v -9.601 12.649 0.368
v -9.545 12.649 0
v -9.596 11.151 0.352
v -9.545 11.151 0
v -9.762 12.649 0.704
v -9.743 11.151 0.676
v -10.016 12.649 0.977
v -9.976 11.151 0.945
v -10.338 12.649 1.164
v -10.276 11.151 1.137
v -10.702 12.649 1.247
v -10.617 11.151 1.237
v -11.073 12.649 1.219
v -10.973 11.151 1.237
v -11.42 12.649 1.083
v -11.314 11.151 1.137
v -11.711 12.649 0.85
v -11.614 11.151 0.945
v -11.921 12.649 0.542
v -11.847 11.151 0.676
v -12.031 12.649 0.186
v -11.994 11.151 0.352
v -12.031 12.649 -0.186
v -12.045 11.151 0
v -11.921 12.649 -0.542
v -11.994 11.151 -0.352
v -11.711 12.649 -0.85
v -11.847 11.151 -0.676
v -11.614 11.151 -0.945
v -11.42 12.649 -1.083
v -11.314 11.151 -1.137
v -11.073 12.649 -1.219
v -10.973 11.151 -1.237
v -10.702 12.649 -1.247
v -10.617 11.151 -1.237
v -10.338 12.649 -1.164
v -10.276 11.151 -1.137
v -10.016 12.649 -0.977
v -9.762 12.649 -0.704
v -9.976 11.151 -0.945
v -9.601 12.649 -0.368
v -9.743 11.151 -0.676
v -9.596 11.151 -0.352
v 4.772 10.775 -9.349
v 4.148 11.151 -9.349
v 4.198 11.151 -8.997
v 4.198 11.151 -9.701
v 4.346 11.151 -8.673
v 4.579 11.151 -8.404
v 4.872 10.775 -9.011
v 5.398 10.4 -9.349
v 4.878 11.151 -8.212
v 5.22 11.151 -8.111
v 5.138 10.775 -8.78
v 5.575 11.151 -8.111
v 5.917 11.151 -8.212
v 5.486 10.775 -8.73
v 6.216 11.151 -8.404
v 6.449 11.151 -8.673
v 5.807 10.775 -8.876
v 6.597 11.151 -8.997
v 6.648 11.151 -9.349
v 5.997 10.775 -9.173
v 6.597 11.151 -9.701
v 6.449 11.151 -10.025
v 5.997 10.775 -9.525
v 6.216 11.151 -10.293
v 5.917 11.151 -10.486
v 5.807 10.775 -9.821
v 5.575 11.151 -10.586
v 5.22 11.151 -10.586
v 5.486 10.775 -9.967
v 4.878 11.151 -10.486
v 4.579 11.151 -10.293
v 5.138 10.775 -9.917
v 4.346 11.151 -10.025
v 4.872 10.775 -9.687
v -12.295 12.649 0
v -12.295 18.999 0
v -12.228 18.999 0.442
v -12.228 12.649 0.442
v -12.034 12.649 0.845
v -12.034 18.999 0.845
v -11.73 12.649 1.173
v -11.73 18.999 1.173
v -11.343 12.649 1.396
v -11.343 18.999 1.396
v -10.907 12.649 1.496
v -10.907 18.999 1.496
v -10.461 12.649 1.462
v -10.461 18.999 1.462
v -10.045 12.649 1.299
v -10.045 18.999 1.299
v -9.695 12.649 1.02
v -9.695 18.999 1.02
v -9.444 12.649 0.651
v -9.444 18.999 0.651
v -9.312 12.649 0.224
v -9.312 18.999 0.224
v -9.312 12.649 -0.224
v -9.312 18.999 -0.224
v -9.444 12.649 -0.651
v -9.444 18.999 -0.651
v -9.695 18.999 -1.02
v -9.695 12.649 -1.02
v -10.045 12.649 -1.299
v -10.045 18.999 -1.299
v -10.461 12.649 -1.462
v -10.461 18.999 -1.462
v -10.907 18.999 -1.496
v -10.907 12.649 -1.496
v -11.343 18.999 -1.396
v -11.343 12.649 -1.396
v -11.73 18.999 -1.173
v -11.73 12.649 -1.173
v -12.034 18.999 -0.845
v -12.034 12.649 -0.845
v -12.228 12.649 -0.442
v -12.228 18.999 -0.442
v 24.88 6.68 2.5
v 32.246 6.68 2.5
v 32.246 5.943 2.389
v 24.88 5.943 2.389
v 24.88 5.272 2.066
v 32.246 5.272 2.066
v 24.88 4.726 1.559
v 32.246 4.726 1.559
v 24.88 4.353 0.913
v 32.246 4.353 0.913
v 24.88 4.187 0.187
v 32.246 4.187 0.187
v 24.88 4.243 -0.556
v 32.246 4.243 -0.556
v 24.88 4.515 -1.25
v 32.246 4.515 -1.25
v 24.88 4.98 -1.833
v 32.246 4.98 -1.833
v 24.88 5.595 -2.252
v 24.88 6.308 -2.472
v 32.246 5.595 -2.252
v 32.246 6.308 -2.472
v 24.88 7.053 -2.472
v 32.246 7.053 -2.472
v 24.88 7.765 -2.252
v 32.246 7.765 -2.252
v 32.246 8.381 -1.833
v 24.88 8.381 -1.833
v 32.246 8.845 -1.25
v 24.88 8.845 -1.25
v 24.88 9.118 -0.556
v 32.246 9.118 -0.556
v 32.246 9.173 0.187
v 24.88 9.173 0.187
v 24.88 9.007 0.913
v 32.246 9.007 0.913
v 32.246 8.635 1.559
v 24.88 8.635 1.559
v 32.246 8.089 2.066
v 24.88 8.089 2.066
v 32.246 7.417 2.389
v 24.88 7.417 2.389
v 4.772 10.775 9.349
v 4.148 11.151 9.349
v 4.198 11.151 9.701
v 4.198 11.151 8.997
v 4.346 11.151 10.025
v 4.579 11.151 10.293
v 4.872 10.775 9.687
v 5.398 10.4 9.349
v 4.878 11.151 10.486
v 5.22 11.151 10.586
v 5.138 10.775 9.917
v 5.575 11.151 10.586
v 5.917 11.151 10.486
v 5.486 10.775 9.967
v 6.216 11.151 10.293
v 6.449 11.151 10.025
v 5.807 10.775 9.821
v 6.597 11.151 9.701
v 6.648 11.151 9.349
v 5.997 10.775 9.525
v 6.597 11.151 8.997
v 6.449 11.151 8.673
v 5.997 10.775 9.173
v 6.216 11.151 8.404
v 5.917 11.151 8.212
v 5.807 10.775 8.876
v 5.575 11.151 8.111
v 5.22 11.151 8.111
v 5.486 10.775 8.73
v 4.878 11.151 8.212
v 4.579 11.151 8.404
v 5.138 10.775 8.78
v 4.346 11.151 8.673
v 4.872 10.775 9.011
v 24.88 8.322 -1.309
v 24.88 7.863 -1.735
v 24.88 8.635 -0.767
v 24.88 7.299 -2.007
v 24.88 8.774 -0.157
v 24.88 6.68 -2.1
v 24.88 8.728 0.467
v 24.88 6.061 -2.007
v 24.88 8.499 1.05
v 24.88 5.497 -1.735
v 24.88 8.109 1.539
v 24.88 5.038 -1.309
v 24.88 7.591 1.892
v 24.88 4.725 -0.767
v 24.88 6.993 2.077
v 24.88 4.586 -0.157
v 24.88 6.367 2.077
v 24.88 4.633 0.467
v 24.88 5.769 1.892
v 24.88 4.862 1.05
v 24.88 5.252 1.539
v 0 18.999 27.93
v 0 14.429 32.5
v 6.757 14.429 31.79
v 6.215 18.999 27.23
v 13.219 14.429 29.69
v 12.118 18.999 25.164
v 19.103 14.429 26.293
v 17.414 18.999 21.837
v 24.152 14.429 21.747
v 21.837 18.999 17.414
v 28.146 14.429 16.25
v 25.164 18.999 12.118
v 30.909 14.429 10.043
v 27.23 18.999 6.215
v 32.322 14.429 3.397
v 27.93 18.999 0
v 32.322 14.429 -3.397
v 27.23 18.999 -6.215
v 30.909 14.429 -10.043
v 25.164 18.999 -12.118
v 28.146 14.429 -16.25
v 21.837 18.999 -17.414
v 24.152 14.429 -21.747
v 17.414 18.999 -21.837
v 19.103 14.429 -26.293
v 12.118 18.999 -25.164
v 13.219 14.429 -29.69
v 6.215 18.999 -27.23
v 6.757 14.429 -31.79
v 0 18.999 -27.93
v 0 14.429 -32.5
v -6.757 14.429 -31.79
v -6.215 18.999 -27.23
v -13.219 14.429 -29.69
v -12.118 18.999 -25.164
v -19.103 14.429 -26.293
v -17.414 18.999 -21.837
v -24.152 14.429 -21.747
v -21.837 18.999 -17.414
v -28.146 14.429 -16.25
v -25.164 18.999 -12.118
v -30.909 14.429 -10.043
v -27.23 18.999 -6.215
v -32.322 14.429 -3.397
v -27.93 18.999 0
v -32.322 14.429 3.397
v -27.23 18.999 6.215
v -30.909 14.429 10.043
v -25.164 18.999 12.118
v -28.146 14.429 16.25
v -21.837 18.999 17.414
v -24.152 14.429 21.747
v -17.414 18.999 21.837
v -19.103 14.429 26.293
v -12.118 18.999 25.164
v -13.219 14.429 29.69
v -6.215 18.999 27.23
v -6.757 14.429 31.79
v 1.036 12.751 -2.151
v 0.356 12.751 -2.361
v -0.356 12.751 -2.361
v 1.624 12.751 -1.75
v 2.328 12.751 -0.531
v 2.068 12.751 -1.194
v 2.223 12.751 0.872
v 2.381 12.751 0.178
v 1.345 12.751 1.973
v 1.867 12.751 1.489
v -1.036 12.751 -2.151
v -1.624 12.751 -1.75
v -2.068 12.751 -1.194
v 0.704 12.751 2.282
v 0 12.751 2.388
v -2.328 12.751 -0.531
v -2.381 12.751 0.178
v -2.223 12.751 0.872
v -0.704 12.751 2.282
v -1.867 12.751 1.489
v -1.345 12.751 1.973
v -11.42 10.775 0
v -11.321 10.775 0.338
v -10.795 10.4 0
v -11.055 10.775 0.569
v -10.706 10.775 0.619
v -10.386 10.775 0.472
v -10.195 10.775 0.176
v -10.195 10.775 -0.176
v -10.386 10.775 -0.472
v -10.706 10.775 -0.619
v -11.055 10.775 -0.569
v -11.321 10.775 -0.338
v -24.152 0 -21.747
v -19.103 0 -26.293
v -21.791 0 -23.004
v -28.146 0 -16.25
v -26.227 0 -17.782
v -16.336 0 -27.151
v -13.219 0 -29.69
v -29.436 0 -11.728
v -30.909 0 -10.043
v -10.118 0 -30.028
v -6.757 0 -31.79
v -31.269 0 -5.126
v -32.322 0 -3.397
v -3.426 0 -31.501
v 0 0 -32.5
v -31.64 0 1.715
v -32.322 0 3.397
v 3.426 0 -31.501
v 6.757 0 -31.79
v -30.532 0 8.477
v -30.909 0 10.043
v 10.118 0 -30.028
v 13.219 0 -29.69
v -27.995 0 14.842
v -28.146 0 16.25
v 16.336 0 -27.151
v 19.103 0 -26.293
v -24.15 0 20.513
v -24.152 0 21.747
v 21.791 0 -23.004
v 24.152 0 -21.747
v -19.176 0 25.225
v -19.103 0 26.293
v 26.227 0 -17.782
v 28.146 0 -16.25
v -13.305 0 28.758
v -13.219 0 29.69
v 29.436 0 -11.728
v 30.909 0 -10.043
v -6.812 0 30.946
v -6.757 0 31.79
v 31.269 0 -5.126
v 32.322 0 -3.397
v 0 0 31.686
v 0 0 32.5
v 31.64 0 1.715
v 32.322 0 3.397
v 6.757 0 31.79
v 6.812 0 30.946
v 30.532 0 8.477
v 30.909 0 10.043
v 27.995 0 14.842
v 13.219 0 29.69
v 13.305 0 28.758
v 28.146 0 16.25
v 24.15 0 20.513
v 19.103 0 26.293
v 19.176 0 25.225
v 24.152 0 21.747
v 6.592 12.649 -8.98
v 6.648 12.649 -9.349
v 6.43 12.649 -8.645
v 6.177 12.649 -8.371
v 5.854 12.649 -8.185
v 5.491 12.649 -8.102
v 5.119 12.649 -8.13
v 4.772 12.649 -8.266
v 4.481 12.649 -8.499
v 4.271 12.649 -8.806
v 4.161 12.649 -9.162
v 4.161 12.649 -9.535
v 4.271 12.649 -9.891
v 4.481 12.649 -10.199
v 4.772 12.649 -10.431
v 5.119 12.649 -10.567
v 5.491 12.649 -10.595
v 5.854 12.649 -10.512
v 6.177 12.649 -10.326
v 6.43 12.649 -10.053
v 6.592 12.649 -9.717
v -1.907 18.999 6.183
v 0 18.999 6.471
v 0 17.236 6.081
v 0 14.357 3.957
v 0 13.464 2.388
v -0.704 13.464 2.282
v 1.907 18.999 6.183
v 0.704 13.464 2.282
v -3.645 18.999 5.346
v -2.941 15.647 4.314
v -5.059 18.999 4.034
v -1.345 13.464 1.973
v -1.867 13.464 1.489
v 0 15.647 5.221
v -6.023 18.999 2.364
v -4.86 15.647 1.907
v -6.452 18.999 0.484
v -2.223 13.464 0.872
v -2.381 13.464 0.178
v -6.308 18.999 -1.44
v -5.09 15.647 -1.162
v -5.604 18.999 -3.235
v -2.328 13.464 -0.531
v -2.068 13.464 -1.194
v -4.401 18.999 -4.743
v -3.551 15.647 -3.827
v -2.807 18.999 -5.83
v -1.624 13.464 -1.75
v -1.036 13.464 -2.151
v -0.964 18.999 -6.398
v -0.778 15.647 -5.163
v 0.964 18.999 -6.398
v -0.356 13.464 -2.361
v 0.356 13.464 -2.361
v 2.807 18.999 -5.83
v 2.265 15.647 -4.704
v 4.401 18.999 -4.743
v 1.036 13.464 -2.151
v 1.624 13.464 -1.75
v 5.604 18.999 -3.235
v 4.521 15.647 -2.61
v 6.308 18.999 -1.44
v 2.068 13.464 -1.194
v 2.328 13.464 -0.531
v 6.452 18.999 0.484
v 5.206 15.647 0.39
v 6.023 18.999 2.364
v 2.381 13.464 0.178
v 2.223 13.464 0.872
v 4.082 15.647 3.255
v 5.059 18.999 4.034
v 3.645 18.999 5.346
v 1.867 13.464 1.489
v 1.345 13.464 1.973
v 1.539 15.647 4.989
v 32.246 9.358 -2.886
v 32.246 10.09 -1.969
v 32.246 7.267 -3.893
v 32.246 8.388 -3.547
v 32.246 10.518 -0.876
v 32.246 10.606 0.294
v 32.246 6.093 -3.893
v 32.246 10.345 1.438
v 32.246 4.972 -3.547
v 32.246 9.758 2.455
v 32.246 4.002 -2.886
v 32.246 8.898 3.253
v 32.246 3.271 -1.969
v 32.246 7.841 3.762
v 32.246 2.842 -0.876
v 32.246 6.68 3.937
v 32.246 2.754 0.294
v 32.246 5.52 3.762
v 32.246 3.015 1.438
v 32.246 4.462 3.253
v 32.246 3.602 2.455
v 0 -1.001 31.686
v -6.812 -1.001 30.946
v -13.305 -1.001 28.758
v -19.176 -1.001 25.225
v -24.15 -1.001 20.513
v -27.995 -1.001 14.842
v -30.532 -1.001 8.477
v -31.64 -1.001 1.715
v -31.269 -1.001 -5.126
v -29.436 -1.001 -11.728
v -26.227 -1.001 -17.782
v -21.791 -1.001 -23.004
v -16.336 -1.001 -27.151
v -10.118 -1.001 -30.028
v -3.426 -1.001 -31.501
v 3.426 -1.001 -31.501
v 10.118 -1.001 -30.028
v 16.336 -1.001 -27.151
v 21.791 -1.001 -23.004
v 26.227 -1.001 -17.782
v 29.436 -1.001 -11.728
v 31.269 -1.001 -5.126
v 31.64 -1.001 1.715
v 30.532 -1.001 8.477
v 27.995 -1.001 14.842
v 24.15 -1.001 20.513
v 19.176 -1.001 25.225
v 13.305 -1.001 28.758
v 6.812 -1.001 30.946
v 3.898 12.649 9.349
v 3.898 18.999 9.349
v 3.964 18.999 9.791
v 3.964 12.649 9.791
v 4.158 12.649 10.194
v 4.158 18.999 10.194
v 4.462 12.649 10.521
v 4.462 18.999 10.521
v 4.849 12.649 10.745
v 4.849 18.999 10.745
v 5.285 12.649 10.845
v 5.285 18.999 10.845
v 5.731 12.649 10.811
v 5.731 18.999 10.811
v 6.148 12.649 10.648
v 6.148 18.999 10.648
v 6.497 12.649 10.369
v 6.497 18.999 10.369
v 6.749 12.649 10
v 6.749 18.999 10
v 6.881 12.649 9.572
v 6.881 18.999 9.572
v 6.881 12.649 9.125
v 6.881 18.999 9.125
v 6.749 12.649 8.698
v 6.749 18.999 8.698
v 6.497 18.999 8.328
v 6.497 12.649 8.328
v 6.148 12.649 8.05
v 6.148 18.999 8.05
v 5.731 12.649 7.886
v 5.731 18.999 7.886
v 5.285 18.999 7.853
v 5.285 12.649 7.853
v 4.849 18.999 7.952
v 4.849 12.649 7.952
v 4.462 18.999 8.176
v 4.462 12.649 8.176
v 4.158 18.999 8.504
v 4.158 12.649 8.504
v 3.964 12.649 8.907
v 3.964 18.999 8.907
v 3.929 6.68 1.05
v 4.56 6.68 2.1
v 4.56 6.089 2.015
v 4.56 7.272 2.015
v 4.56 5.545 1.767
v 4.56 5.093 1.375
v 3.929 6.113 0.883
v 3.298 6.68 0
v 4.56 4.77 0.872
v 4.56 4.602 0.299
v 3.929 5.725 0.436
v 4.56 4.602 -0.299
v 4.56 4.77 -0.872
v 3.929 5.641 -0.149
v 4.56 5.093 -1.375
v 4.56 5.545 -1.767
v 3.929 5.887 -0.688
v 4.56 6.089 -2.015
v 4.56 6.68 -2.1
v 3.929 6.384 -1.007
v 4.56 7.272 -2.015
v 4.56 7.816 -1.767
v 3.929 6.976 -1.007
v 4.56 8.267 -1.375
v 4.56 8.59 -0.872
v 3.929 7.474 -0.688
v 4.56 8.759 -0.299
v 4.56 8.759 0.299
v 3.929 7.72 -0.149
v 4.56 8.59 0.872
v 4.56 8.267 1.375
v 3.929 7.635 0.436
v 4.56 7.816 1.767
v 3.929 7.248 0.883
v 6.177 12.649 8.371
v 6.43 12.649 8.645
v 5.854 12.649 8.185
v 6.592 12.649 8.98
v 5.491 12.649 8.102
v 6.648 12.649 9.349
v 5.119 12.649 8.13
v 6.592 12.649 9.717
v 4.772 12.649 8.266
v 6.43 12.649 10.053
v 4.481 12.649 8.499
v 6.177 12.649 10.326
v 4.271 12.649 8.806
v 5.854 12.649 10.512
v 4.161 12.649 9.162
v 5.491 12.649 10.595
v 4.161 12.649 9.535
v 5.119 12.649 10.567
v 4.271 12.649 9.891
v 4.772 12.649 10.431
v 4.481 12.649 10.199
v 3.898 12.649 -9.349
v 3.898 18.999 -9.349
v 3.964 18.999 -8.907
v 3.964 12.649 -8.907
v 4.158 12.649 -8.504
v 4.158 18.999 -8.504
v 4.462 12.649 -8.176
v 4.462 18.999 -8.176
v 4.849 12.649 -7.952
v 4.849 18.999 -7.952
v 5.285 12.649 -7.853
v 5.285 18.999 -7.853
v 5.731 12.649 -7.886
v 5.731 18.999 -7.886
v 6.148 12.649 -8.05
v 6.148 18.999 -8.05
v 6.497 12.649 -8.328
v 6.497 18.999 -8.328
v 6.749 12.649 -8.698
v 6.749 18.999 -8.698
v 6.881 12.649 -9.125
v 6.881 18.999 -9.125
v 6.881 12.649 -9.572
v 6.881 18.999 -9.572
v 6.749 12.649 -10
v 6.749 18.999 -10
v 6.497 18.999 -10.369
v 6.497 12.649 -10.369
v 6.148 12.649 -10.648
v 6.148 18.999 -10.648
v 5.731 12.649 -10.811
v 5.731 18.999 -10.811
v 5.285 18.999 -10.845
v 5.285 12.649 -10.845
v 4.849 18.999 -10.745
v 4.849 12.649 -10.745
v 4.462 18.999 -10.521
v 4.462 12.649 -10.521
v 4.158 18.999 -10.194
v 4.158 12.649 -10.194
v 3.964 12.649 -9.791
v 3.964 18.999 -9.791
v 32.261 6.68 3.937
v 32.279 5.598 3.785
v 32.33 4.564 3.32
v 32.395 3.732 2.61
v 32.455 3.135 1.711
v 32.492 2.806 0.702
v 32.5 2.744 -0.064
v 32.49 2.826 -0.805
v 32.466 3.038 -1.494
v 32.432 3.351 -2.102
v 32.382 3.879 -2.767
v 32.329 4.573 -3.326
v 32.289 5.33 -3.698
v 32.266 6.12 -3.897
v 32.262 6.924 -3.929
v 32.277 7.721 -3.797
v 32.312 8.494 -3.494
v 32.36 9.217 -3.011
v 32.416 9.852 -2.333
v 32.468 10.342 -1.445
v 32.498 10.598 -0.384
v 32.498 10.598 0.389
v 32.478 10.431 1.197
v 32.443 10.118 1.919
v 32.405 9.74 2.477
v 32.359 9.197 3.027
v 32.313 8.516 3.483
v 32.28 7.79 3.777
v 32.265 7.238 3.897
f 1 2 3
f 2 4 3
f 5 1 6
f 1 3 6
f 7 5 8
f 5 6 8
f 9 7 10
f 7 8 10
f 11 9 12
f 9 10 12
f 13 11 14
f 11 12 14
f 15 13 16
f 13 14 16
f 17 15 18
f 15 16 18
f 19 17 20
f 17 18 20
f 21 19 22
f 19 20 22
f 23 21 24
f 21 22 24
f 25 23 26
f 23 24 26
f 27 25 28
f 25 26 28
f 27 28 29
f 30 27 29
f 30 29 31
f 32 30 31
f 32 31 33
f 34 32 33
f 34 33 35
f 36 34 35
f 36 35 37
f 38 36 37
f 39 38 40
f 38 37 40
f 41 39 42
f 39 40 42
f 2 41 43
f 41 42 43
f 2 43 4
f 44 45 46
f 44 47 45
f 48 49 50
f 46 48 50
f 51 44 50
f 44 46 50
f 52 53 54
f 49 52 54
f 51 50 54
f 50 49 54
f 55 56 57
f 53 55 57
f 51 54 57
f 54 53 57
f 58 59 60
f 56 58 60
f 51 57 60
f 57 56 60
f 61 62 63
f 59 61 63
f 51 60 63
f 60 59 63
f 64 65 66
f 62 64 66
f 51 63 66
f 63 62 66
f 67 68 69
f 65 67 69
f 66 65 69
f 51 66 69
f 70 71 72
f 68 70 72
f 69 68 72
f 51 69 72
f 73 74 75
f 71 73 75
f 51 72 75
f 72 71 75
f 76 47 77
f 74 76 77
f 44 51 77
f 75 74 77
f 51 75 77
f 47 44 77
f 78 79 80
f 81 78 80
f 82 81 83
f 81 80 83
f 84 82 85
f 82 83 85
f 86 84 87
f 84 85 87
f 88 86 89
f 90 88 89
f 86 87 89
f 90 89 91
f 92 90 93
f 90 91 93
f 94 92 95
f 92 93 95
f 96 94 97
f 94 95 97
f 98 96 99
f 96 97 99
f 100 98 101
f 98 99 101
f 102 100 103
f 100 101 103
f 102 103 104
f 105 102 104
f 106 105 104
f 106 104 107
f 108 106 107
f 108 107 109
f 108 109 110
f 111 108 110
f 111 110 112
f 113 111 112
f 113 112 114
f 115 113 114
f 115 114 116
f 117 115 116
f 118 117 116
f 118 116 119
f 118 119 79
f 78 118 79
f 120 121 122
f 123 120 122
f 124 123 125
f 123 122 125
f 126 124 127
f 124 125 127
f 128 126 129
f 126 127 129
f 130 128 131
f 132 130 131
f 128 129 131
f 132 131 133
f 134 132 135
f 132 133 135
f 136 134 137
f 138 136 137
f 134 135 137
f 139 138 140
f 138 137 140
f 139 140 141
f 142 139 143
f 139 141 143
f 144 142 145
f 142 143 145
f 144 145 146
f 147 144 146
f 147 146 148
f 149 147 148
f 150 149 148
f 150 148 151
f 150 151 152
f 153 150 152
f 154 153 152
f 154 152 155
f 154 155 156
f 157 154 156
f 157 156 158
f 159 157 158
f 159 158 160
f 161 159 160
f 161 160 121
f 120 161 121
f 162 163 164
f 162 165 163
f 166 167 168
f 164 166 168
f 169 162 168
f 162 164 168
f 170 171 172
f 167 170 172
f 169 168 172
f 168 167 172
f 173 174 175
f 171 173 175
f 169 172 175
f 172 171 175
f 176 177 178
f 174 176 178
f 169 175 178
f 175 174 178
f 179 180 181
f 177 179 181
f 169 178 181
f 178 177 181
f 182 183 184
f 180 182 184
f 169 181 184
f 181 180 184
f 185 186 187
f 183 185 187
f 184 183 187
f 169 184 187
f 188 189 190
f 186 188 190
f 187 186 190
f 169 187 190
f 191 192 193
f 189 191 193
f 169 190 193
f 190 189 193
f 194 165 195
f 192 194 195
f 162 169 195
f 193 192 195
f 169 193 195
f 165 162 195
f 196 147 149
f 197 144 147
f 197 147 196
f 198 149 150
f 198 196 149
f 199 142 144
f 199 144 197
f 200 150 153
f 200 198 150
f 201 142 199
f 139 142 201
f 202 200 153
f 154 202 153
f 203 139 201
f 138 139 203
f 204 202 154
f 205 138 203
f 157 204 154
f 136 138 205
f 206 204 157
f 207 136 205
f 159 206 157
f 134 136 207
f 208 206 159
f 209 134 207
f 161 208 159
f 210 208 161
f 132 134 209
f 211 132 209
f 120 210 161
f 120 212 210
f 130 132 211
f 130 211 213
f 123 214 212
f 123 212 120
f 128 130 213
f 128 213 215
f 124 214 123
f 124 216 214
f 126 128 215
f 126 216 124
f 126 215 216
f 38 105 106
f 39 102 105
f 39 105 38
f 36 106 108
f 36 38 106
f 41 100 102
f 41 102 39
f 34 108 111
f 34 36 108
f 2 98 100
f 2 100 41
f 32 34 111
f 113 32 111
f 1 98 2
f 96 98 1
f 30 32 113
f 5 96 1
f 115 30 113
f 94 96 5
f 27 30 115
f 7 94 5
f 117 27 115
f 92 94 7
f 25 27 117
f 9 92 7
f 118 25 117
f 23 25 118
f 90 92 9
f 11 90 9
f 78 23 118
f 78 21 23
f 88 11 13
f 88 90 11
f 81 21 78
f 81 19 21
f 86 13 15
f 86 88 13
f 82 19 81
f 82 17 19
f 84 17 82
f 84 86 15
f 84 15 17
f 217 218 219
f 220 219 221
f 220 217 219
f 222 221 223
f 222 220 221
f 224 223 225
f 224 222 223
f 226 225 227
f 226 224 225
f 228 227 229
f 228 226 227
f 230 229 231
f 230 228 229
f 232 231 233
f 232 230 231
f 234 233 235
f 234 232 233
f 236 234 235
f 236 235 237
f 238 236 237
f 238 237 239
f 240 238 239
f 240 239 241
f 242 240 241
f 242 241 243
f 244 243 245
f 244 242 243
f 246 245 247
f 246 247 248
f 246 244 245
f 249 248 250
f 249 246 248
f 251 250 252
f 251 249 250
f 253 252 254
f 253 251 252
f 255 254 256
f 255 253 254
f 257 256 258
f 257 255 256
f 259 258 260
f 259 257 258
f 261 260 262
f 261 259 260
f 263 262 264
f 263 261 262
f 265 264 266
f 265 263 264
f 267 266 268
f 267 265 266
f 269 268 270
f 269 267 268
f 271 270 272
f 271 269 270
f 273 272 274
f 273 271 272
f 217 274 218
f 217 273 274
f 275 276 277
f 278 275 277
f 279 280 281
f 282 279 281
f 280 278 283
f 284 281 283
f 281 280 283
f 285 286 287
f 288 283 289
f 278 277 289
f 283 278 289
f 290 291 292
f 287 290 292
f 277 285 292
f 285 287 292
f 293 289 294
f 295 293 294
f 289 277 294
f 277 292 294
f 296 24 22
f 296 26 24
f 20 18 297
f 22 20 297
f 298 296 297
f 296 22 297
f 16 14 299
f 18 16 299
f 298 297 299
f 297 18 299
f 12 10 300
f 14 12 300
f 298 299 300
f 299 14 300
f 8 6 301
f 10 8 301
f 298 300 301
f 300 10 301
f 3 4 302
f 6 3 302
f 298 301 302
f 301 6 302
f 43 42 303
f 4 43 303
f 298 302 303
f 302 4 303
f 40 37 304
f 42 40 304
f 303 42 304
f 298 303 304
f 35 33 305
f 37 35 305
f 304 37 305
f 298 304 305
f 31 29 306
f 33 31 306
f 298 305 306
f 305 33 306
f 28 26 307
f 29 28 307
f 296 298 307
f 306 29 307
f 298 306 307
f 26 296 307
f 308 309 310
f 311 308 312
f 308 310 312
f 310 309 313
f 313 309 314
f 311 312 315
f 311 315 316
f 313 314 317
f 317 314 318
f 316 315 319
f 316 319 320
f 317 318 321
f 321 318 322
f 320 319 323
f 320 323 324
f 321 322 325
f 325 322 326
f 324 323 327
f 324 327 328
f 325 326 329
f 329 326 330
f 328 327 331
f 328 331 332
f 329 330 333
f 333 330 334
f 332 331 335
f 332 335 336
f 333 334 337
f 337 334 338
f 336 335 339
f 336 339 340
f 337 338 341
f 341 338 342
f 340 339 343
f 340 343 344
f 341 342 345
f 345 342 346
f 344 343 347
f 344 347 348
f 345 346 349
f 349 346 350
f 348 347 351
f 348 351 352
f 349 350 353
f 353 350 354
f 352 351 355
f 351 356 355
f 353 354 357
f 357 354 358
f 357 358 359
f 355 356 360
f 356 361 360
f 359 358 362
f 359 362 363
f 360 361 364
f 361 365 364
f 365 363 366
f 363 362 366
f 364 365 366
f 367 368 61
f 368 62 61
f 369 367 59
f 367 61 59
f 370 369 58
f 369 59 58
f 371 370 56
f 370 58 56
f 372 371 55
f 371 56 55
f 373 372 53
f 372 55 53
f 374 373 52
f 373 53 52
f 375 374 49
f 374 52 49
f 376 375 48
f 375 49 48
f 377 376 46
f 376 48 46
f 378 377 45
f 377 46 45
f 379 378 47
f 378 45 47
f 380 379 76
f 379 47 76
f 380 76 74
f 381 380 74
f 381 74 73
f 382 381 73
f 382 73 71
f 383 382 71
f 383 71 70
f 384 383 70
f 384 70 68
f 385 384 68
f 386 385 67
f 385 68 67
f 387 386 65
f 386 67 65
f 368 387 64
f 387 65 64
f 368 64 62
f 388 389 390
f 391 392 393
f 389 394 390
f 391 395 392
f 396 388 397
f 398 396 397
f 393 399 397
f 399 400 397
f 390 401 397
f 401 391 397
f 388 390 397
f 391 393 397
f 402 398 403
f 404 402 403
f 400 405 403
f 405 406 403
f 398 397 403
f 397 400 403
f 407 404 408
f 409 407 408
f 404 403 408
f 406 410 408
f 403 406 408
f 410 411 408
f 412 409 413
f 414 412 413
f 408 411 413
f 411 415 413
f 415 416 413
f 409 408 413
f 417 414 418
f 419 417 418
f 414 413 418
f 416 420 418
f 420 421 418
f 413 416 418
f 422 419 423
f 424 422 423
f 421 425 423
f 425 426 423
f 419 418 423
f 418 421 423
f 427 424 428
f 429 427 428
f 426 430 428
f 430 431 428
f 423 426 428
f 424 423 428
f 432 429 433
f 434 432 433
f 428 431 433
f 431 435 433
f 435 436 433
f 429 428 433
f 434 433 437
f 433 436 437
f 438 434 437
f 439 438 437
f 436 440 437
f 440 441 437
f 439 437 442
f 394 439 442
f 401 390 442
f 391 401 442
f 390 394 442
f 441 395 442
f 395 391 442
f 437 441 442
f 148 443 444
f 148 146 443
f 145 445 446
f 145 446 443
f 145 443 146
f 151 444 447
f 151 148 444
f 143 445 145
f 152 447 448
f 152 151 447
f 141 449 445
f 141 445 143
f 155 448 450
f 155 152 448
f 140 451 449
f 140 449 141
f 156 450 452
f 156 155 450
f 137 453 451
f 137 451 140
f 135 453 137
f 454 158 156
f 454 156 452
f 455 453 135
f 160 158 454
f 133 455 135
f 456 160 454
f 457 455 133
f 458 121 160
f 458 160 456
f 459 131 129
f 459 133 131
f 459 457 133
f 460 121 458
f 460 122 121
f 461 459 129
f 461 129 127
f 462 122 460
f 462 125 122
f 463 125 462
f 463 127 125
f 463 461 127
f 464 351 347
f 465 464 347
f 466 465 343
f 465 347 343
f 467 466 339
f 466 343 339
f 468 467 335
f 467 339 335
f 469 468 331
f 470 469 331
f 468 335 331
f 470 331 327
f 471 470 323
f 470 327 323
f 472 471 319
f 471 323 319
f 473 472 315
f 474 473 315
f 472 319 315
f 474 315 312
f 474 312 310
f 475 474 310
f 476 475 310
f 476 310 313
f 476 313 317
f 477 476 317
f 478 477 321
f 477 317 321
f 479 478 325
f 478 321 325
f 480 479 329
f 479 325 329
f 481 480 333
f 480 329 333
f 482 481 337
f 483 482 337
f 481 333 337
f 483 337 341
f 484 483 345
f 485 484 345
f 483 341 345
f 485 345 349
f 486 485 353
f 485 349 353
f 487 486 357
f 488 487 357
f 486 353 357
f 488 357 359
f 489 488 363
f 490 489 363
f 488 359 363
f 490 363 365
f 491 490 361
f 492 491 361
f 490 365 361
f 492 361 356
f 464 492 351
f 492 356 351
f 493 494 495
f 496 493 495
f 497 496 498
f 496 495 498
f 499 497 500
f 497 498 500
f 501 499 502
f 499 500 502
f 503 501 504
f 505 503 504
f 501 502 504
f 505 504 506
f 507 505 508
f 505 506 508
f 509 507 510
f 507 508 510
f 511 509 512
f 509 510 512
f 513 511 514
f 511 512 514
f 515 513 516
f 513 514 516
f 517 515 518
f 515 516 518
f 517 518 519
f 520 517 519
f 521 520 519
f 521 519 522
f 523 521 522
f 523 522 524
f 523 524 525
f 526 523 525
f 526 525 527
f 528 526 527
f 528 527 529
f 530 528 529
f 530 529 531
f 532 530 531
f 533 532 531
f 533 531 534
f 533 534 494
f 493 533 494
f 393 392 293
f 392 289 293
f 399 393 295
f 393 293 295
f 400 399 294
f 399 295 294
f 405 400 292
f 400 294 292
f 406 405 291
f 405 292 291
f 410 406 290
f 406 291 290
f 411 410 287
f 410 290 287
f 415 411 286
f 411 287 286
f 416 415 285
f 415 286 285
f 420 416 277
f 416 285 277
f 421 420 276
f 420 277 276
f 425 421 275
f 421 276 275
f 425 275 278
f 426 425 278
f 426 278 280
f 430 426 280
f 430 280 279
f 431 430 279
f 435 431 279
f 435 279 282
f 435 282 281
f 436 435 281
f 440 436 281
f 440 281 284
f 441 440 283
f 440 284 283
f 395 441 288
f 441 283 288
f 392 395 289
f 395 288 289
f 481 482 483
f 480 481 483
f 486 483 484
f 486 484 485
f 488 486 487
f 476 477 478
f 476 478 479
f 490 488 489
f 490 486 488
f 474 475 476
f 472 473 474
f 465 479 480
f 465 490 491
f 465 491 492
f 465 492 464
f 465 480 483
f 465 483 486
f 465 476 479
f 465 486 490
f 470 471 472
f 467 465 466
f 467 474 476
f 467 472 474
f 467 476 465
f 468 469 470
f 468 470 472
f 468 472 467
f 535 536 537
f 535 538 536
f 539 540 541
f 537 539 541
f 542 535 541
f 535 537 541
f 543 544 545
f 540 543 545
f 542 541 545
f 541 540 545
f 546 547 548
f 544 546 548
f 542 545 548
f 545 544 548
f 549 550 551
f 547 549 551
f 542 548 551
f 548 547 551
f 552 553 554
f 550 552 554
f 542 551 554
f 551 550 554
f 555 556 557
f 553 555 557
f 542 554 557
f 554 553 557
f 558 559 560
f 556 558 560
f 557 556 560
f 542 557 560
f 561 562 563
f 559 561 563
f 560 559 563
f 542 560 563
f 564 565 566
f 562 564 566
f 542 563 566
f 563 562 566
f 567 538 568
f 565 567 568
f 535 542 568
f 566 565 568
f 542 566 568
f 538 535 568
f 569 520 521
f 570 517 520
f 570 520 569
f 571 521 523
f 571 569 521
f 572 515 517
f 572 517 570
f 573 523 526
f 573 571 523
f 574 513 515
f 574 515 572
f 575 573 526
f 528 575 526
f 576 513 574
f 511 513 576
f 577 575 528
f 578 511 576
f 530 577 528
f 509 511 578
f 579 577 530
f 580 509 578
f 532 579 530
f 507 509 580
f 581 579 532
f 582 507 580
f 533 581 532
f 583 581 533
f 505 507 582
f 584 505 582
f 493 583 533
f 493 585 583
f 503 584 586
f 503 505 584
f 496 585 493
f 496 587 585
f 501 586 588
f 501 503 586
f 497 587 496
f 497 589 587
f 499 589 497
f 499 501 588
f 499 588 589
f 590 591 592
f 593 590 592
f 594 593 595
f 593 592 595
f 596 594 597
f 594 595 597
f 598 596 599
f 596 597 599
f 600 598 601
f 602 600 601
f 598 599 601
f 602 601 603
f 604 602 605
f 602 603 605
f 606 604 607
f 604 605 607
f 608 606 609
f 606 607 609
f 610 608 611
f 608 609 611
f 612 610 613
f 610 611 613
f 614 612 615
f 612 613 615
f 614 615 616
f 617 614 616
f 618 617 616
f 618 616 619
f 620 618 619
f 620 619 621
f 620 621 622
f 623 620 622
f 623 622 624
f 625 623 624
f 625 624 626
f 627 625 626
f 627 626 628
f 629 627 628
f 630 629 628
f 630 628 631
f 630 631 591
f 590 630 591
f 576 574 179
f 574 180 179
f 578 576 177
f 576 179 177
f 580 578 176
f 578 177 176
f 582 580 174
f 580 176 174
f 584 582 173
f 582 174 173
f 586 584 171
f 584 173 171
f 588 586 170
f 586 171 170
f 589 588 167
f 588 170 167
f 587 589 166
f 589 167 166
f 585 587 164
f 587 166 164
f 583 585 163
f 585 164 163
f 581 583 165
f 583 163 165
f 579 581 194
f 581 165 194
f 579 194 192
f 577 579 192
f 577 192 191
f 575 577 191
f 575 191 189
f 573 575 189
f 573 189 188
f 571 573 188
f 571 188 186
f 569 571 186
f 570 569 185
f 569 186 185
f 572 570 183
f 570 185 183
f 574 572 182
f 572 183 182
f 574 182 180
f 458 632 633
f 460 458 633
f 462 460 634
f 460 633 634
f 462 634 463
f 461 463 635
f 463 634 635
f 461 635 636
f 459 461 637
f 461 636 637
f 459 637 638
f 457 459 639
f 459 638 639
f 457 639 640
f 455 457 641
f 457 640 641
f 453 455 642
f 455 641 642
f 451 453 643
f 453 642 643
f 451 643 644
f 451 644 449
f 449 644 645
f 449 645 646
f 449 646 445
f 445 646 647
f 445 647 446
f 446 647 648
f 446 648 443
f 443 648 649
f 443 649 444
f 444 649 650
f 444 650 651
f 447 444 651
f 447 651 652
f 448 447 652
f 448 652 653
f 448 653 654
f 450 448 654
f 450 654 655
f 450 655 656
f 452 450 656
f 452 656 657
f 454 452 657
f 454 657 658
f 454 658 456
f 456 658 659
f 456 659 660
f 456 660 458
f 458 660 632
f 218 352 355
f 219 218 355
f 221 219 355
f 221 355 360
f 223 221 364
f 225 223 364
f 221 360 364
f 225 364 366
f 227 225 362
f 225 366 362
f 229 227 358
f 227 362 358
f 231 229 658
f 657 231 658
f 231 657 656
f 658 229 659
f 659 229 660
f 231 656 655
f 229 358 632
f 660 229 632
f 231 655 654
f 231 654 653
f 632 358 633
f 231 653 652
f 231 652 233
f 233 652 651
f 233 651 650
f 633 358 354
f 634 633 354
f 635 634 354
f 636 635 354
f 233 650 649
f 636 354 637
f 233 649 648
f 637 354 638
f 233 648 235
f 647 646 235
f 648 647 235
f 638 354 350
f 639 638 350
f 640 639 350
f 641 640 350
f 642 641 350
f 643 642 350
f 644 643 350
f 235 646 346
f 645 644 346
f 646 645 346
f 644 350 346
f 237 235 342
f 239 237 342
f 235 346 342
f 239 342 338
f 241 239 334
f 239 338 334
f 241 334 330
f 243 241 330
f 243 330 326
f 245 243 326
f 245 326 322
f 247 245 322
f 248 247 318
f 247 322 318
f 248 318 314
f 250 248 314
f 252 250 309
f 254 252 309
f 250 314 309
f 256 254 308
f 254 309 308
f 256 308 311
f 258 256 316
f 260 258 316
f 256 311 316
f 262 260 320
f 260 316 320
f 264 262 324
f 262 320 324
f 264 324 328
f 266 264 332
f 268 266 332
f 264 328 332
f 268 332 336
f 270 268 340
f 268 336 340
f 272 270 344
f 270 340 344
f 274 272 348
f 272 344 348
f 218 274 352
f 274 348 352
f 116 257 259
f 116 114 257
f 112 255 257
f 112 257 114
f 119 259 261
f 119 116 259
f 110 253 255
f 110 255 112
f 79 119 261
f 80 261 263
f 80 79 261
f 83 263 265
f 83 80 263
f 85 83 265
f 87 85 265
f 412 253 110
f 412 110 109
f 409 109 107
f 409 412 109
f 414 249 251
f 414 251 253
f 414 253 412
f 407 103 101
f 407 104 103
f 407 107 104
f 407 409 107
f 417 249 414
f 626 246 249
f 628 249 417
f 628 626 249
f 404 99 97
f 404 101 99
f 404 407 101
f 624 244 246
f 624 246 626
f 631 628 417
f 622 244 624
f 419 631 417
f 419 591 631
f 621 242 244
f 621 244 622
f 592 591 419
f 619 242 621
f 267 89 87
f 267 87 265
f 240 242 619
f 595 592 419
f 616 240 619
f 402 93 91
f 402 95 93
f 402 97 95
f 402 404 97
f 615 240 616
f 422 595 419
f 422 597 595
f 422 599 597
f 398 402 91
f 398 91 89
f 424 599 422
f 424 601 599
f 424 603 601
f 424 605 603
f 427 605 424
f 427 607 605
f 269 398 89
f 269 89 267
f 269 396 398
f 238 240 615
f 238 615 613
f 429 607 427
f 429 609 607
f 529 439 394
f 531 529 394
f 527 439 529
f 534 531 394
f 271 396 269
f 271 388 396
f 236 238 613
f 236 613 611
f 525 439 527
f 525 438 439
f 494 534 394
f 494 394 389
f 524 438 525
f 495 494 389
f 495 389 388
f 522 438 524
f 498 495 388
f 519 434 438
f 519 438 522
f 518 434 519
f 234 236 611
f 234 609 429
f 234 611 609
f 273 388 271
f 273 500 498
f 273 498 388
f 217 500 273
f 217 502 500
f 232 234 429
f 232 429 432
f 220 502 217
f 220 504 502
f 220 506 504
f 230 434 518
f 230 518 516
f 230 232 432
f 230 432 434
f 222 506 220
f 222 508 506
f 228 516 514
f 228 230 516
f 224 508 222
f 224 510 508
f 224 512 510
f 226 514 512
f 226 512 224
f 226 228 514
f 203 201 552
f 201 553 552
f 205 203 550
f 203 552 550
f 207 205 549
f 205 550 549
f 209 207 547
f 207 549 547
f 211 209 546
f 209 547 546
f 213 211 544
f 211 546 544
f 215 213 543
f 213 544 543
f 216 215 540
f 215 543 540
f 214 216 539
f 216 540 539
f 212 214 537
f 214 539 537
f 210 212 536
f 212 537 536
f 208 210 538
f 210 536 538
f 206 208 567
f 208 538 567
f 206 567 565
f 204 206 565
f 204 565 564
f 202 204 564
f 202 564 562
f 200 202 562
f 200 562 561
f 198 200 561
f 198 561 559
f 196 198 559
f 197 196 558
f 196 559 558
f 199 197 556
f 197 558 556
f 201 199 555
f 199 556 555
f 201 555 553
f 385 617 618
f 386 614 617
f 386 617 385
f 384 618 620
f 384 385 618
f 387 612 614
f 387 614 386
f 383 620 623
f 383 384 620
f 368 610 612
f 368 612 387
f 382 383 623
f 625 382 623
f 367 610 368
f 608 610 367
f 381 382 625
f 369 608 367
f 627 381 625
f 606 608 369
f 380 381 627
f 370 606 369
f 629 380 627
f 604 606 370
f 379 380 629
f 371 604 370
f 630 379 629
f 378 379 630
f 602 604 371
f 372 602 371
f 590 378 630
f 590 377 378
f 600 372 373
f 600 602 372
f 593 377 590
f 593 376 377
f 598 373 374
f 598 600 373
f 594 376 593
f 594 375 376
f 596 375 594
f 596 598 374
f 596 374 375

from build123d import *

# Parameters (mm, degrees)
SKETCH1_R                       = 32.5
EXTRUDE1_DEPTH                  = 18.9992
CHAMFER1_SIZE                   = 4.57
M3X0_5_TAPPED_HOLE3_D           = 2.5
M3X0_5_TAPPED_HOLE3_DEPTH       = 7.8486
M3X0_5_TAPPED_HOLE3_CBORE_D     = 3
M3X0_5_TAPPED_HOLE3_CBORE_DEPTH = 6.35
M3X0_5_TAPPED_HOLE3_TIP         = 0.751075774
M5X0_8_TAPPED_HOLE1_D           = 4.2
M5X0_8_TAPPED_HOLE1_DEPTH       = 27.94
M5X0_8_TAPPED_HOLE1_CBORE_D     = 5
M5X0_8_TAPPED_HOLE1_CBORE_DEPTH = 7.62
M5X0_8_TAPPED_HOLE1_TIP         = 1.2618073
HOLE1_D                         = 3.048
HOLE1_DEPTH                     = 6.35
HOLE1_CBORE_D                   = 7.874
HOLE1_CBORE_DEPTH               = 0.254
HOLE1_TIP                       = 0.915711583
SKETCH2_R                       = 31.6865
EXTRUDE2_DEPTH                  = 1.00076


with BuildPart() as part:
    # Sketch1 → Extrude1 (new body)
    with BuildSketch(Plane(origin=(0, 0, 0), x_dir=(1, 0, 0), z_dir=(0, 1, 0))):
        with Locations(Location((0, 0, 0), (0, 0, 270))):  # turned: the seam where the file's is
            Circle(SKETCH1_R)
    extrude(amount=EXTRUDE1_DEPTH)

    # Sketch3 → Cut-Revolve1 (revolve, cut)
    with BuildSketch(Plane.XY, mode=Mode.PRIVATE) as cut_revolve1_sk:
        with BuildLine():
            Line((2.3876, 13.463763428), (2.3876, 12.7508))
            Line((2.3876, 12.7508), (0, 12.7508))
            Line((0, 12.7508), (0, 18.9992))
            Line((0, 18.9992), (6.470525878, 18.9992))
            ThreePointArc((6.470525878, 18.9992), (5.220905936, 15.647420055), (2.3876, 13.463763428))
        make_face()
    revolve(cut_revolve1_sk.sketch.rotate(Axis((0, 18.9992, 0), (0, -1, 0)), 90), axis=Axis((0, 18.9992, 0), (0, -1, 0)), mode=Mode.SUBTRACT)  # turned: the seam where the file's is

    # Chamfer1
    chamfer1_edges = [part.edges().sort_by_distance(p)[0] for p in [
        (0, 18.9992, -32.5),
    ]]
    chamfer(chamfer1_edges, length=CHAMFER1_SIZE)

    # M3x0.5 Tapped Hole3
    with Locations(Plane(origin=(0, 18.9992, 0), x_dir=(-1, 0, 0), z_dir=(0, 1, 0))):
        with Locations((-5.3975, -9.348744234), (10.795, 0), (-5.3975, 9.348744234)):
            CounterBoreHole(M3X0_5_TAPPED_HOLE3_D / 2, M3X0_5_TAPPED_HOLE3_CBORE_D / 2, M3X0_5_TAPPED_HOLE3_CBORE_DEPTH, depth=M3X0_5_TAPPED_HOLE3_DEPTH)
            with Locations((0, 0, -(M3X0_5_TAPPED_HOLE3_DEPTH + M3X0_5_TAPPED_HOLE3_TIP / 2))):  # 118° drill point
                Cone(0, M3X0_5_TAPPED_HOLE3_D / 2, M3X0_5_TAPPED_HOLE3_TIP, mode=Mode.SUBTRACT)

    # M5x0.8 Tapped Hole1
    with Locations(Plane(origin=(32.5, 6.6802, 0), x_dir=(0, 0, 1), z_dir=(1, 0, 0))):
        with Locations((0, 0)):
            CounterBoreHole(M5X0_8_TAPPED_HOLE1_D / 2, M5X0_8_TAPPED_HOLE1_CBORE_D / 2, M5X0_8_TAPPED_HOLE1_CBORE_DEPTH, depth=M5X0_8_TAPPED_HOLE1_DEPTH)
            with Locations((0, 0, -(M5X0_8_TAPPED_HOLE1_DEPTH + M5X0_8_TAPPED_HOLE1_TIP / 2))):  # 118° drill point
                Cone(0, M5X0_8_TAPPED_HOLE1_D / 2, M5X0_8_TAPPED_HOLE1_TIP, mode=Mode.SUBTRACT)

    # Hole1
    with Locations(Plane(origin=(32.5, 6.6802, 0), x_dir=(0, 0, 1), z_dir=(1, 0, 0))):
        with Locations((0, 0)):
            CounterBoreHole(HOLE1_D / 2, HOLE1_CBORE_D / 2, HOLE1_CBORE_DEPTH, depth=HOLE1_DEPTH)
            with Locations((0, 0, -(HOLE1_DEPTH + HOLE1_TIP / 2))):  # 118° drill point
                Cone(0, HOLE1_D / 2, HOLE1_TIP, mode=Mode.SUBTRACT)

    # Sketch2 → Extrude2 (add)
    with BuildSketch(Plane.XZ):
        with Locations(Location((0, 0, 0), (0, 0, 90))):  # turned: the seam where the file's is
            Circle(SKETCH2_R)
    extrude(amount=EXTRUDE2_DEPTH)


solid = part.part
